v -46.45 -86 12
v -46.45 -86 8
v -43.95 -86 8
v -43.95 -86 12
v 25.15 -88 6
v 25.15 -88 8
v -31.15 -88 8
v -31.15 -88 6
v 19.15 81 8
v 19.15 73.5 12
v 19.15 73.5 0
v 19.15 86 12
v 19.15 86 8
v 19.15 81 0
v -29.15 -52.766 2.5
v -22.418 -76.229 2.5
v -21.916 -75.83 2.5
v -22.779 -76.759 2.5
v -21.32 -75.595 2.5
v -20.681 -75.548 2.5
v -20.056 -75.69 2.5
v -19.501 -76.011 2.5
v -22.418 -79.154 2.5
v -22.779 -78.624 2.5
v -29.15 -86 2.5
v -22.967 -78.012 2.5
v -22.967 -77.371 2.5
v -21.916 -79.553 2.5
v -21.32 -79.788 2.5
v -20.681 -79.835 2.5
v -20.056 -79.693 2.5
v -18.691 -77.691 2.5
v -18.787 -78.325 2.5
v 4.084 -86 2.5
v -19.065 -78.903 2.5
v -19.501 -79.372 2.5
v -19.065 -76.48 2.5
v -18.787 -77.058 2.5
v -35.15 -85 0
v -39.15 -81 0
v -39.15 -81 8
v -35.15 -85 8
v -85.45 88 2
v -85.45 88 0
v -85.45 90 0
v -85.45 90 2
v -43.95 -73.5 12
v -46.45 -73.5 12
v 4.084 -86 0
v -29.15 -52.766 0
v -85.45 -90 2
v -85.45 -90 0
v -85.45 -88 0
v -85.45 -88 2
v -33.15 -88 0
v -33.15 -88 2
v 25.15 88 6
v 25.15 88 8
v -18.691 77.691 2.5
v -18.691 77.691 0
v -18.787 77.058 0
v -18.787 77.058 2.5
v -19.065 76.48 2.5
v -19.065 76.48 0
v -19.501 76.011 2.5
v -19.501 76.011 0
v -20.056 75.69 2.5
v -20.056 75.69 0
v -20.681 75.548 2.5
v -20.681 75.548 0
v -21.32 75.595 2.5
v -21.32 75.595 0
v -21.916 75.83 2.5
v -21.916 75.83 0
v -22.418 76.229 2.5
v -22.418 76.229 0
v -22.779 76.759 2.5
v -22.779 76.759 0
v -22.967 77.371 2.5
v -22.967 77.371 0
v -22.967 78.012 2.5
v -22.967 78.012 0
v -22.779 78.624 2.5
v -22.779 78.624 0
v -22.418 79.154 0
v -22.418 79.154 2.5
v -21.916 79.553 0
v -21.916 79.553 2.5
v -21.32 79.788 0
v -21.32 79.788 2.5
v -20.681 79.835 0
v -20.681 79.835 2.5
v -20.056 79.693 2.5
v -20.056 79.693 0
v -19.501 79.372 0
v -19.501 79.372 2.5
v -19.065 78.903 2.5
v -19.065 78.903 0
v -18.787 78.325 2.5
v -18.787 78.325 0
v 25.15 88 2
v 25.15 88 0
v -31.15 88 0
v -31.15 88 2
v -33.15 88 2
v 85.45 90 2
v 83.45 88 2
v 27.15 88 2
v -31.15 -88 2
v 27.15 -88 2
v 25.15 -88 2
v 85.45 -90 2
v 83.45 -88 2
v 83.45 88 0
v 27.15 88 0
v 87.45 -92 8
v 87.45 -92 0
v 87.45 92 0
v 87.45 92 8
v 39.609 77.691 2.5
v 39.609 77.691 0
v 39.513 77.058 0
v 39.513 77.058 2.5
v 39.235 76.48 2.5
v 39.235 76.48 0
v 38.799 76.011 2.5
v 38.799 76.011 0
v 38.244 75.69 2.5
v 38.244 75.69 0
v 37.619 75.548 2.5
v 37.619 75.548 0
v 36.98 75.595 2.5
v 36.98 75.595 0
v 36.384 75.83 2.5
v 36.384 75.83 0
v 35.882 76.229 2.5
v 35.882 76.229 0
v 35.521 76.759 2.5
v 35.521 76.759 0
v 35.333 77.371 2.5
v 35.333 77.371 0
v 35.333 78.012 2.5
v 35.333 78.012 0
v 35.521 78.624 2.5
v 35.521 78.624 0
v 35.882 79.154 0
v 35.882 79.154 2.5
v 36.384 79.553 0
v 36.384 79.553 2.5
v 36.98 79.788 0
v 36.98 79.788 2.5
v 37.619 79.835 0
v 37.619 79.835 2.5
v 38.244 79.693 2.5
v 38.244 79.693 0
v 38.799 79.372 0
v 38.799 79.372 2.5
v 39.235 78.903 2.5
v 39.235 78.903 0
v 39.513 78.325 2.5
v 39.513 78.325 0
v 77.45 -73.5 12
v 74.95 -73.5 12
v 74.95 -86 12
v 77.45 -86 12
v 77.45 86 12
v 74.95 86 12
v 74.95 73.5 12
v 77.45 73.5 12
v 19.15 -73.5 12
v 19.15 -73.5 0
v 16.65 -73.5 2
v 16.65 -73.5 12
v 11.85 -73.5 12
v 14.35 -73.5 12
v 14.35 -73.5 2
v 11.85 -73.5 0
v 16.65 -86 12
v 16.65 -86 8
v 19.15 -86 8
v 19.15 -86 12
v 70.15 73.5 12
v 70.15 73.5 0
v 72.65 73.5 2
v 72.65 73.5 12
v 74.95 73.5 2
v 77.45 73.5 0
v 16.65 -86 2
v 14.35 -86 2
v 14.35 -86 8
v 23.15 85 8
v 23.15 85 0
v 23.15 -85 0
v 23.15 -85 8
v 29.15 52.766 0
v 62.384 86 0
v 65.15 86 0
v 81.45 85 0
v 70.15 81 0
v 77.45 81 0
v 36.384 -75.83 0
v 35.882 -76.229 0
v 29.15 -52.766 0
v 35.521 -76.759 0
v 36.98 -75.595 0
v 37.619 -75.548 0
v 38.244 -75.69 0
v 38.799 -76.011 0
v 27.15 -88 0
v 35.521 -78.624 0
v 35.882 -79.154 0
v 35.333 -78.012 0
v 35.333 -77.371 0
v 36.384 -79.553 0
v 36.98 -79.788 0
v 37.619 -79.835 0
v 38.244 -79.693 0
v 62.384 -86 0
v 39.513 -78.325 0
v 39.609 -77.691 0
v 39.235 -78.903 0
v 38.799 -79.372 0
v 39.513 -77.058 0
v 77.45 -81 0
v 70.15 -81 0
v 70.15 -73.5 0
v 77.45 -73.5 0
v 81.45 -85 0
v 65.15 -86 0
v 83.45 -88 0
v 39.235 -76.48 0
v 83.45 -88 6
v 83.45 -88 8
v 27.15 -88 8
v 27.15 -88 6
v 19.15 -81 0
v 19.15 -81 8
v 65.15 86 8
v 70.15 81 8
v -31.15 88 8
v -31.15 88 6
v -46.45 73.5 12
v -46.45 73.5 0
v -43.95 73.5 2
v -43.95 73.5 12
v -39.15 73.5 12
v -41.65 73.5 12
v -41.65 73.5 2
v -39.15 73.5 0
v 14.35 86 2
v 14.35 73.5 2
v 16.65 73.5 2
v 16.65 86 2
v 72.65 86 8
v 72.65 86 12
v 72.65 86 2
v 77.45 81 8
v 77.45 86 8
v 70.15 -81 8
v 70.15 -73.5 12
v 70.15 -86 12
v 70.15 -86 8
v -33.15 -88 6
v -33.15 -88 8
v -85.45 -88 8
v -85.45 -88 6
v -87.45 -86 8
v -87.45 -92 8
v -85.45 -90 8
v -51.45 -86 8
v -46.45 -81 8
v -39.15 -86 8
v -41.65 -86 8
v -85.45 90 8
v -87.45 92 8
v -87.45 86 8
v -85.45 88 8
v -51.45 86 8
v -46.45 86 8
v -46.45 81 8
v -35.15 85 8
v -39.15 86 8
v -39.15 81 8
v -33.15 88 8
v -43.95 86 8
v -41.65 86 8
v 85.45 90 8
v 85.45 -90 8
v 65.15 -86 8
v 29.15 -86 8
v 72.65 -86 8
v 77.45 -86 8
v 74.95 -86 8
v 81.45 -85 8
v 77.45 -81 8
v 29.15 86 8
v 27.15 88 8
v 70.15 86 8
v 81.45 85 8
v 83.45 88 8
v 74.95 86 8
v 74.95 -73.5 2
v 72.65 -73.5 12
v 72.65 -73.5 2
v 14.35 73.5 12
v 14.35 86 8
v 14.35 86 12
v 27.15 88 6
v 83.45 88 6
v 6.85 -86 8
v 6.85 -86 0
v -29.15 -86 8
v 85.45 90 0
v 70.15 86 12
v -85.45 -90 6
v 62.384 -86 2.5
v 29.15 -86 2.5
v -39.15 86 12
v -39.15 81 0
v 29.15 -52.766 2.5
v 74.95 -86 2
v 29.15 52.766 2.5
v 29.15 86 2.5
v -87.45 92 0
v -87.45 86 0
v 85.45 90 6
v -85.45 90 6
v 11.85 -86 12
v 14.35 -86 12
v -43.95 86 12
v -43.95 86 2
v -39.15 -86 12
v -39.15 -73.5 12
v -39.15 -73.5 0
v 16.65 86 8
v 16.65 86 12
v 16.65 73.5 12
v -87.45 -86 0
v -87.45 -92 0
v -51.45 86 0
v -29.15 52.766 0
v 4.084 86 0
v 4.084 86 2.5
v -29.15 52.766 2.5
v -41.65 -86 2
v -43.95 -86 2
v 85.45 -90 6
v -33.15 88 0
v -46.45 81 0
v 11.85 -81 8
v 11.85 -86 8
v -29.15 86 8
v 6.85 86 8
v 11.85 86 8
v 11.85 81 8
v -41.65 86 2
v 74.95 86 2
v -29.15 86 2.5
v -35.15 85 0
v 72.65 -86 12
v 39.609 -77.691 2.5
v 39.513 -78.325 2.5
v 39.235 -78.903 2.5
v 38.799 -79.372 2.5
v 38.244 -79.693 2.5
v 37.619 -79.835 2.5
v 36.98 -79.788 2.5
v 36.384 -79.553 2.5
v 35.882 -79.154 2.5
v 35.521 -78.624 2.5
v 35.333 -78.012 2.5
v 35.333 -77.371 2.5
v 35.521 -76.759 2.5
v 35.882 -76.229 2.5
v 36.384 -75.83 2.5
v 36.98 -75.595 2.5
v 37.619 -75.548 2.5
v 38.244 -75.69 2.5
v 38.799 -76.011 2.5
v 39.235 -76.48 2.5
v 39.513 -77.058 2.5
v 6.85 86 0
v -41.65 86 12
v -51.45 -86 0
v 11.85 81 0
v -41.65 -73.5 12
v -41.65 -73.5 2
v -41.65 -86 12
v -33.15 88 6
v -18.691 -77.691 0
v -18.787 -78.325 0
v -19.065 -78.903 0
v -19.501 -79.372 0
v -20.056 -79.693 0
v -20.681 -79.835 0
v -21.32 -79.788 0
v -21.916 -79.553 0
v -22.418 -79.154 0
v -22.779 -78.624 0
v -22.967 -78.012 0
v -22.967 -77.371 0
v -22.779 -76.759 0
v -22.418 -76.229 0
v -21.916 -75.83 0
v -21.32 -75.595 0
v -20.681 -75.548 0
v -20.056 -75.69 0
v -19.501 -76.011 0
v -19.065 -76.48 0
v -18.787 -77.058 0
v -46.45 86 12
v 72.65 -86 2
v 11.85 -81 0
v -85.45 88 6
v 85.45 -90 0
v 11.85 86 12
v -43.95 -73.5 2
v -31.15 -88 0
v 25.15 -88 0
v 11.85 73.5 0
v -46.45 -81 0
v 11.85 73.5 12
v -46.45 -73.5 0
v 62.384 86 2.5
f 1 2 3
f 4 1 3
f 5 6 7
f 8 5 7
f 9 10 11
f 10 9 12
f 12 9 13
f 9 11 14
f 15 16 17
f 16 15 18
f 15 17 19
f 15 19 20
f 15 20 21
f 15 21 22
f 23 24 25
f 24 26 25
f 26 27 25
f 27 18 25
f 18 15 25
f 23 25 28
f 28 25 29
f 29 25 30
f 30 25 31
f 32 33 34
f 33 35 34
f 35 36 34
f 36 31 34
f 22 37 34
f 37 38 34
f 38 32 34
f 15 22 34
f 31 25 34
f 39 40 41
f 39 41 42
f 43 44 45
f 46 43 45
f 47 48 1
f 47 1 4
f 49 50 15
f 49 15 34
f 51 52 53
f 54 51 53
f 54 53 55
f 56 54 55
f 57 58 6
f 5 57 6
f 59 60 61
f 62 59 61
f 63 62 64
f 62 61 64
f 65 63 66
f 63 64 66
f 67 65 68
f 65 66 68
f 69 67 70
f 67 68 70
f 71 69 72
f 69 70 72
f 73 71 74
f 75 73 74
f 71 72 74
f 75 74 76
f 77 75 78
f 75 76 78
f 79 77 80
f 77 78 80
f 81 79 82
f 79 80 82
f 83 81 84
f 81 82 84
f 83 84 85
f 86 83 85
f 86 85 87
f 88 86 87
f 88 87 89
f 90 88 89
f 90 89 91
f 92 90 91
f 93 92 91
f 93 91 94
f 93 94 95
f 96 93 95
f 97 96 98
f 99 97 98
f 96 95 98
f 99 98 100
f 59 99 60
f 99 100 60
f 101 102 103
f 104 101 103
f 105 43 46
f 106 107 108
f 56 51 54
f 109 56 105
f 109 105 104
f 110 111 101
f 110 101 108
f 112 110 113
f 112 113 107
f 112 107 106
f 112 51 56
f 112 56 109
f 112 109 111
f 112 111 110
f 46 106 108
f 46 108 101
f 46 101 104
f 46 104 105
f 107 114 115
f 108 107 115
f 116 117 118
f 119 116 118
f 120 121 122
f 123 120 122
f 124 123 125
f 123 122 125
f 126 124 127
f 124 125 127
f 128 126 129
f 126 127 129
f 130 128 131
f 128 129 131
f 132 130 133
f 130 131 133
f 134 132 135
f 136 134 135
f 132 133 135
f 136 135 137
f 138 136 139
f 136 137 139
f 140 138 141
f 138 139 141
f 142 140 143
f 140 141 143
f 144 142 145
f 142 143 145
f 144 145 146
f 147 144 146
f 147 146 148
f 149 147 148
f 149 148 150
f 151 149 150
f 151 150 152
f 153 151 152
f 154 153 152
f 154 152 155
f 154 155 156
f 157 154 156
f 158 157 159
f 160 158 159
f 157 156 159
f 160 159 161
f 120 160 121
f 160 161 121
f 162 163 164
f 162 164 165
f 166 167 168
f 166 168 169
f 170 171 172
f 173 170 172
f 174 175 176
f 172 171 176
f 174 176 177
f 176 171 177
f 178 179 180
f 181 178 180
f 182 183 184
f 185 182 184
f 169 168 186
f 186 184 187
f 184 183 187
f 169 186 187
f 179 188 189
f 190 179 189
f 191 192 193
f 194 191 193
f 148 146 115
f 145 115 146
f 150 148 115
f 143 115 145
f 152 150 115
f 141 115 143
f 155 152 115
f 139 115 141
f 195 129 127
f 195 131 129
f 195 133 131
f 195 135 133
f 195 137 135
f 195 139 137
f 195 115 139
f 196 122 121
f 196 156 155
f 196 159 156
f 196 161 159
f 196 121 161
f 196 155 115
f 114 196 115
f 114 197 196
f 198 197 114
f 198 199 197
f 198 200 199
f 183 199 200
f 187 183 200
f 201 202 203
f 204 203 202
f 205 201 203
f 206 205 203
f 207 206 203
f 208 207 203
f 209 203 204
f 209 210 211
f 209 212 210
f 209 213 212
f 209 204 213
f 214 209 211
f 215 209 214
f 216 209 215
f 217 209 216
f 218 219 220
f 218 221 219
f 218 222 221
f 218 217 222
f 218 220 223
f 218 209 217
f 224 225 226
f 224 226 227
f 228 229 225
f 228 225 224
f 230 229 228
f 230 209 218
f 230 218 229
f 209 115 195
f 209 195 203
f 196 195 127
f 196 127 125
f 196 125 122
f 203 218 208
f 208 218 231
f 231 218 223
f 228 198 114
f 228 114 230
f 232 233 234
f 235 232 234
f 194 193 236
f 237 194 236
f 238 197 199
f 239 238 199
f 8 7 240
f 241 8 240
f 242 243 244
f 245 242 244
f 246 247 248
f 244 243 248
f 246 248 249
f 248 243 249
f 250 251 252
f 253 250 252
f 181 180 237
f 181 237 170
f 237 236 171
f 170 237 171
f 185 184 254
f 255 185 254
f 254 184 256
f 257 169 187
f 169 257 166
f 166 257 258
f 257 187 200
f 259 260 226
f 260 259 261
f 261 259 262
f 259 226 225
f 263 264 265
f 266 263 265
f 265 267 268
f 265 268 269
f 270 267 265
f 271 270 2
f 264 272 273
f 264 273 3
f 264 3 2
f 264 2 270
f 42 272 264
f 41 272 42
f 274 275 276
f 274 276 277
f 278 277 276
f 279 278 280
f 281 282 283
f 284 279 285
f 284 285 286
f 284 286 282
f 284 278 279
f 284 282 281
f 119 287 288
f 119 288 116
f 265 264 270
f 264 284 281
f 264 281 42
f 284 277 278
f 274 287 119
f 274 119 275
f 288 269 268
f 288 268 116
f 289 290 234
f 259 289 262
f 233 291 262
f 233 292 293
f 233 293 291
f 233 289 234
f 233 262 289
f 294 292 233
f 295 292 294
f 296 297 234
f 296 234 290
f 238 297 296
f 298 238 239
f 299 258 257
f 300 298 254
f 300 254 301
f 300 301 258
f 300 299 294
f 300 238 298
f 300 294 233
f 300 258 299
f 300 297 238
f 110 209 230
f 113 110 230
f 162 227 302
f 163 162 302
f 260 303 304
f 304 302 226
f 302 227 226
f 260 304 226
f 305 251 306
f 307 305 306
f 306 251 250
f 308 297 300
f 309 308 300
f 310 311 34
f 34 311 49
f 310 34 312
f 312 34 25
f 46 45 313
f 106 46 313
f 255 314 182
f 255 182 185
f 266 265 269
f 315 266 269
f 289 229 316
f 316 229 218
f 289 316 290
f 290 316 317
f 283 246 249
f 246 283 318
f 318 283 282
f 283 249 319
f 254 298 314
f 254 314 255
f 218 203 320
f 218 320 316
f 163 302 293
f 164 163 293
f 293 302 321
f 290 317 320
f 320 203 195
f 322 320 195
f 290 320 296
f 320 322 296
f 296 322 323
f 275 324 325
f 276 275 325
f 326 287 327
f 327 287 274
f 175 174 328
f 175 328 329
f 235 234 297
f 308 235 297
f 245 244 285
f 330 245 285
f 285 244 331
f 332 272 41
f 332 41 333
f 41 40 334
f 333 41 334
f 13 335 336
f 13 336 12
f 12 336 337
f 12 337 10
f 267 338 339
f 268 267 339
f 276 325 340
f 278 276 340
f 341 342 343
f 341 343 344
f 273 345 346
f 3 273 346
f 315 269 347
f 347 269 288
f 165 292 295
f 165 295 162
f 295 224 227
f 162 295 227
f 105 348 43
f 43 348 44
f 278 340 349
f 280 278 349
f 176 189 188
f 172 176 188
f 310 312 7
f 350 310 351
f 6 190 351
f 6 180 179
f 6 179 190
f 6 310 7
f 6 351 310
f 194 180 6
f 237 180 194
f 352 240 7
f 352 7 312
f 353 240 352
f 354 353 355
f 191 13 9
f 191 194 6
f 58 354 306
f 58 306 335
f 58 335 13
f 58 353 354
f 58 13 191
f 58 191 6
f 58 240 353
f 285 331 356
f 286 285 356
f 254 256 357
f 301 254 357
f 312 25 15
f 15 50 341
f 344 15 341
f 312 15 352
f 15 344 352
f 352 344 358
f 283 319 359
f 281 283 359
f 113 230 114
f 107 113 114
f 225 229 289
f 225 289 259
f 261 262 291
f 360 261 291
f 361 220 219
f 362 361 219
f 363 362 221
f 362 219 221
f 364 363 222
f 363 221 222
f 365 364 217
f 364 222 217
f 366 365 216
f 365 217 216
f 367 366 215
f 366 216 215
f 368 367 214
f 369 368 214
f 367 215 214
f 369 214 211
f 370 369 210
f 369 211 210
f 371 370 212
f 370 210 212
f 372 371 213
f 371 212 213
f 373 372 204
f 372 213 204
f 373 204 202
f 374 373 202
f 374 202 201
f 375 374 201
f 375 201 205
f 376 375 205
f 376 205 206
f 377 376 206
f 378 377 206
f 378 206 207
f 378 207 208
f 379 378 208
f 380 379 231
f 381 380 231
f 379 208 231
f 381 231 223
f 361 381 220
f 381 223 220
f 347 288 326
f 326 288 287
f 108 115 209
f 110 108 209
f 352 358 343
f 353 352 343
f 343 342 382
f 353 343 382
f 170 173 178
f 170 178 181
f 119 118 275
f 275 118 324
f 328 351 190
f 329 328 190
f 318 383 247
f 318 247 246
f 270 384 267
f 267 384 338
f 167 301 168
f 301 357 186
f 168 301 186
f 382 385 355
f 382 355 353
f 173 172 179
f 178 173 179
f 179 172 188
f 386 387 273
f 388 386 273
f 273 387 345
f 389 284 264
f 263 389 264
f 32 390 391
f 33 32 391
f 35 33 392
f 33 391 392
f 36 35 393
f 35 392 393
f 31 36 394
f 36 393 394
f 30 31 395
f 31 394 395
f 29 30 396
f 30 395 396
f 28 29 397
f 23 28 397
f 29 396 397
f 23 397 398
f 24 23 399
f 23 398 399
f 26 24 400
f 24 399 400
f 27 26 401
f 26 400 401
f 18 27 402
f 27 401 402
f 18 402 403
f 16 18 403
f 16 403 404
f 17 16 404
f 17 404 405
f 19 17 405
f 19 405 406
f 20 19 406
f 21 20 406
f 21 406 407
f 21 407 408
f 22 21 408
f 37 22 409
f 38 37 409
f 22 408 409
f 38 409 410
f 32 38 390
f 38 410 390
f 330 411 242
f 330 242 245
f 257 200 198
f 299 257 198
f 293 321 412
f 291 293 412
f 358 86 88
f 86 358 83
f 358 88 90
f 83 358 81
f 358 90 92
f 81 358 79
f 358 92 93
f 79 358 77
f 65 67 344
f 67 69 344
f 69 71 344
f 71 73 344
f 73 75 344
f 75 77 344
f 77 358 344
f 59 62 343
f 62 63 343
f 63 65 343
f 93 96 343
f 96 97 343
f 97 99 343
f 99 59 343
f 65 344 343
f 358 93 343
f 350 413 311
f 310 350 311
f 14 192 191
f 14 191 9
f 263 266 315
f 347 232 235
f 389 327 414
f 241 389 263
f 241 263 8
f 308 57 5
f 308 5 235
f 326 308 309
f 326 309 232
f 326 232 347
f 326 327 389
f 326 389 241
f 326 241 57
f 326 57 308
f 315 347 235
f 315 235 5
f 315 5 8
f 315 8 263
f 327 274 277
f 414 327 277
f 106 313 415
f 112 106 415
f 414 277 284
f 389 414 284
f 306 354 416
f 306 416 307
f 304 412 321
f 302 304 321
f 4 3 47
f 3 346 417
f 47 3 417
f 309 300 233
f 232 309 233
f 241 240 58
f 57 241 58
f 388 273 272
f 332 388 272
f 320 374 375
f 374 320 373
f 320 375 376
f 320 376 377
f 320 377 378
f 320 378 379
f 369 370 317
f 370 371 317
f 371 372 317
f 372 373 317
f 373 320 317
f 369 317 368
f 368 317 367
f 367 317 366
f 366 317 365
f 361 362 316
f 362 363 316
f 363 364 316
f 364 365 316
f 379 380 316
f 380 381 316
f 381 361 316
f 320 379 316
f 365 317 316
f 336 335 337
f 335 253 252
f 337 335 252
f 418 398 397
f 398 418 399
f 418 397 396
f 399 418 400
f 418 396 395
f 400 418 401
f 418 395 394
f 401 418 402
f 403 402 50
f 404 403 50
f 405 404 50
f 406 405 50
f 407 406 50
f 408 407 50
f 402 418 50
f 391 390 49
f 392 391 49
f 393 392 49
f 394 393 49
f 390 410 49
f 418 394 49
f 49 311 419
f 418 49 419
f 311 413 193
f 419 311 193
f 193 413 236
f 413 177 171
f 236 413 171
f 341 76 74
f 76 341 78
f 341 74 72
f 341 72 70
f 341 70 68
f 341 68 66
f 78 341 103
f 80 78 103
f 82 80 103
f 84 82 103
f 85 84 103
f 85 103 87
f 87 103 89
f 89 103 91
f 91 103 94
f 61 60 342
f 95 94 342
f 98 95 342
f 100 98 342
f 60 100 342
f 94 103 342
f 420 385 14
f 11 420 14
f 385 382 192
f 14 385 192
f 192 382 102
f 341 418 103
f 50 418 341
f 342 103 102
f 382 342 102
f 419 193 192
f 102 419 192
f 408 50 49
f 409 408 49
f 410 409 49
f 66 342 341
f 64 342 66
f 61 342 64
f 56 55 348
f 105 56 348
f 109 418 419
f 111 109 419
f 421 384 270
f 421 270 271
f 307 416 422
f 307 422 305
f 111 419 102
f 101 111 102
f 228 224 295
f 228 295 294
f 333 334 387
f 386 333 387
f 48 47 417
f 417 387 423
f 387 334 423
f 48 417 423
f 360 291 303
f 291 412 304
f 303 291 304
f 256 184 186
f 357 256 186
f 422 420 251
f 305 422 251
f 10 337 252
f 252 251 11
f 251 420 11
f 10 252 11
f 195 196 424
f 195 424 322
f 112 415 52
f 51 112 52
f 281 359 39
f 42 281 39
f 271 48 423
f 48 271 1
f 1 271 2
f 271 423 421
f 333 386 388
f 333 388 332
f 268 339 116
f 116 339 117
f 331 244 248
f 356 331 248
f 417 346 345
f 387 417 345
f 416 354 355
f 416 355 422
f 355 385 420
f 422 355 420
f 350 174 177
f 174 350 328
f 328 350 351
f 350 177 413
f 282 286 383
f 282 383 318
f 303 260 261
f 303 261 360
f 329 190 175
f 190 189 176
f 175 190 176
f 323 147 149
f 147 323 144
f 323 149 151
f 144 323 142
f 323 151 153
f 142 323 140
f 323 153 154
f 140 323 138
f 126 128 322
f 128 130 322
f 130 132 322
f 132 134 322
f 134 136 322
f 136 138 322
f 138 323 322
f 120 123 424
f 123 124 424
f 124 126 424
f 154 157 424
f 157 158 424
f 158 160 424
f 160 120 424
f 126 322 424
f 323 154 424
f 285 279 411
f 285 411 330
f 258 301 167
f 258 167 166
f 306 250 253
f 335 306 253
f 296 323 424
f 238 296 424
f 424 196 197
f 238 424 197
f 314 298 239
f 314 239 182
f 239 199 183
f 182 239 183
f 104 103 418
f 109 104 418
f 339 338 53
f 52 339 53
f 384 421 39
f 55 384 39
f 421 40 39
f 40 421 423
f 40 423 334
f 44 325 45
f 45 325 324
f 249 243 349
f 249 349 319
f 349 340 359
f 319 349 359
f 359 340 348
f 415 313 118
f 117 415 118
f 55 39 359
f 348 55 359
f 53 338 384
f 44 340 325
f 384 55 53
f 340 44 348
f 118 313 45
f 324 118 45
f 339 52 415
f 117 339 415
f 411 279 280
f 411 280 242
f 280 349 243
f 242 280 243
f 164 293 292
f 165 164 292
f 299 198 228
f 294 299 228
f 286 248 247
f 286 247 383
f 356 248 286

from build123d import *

# Parameters (mm, degrees)
F1_DEPTH     = 8
F2_W         = 2.5
F2_H         = 12.5
F3_DEPTH     = 4
F4_W         = 7.3
F4_H         = 12.5
F5_DEPTH     = 2
F7_DEPTH     = 2
F9_DEPTH     = 2
F10_T1_DEPTH = 8
F11_R        = 2.15
F12_DEPTH    = 2.5


# Not quite as in the source:
# - a fillet or chamfer that OpenCascade refuses, or shapes differently, is made with other operations: its cross-section is extruded or revolved along the edge and cut away or added


with BuildPart() as f1:
    # F0 (on Top) → F1 (new body)
    with BuildSketch(Plane.XY):
        Polygon((87.45, 92), (-87.45, 92), (-87.45, 86), (-46.45, 86), (-46.45, 73.5), (-43.95, 73.5), (-43.95, 86), (-41.65, 86), (-41.65, 73.5), (-39.15, 73.5), (-39.15, 86), (-35.15, 86), (-35.15, 0), (-35.15, -86), (-39.15, -86), (-39.15, -73.5), (-41.65, -73.5), (-41.65, -86), (-43.95, -86), (-43.95, -73.5), (-46.45, -73.5), (-46.45, -86), (-87.45, -86), (-87.45, -92), (87.45, -92), (87.45, 0), align=None)
        Polygon((-29.15, -86), (-29.15, 0), (-29.15, 86), (11.85, 86), (11.85, 73.5), (14.35, 73.5), (14.35, 86), (16.65, 86), (16.65, 73.5), (19.15, 73.5), (19.15, 86), (23.15, 86), (23.15, 0), (23.15, -86), (19.15, -86), (19.15, -73.5), (16.65, -73.5), (16.65, -86), (14.35, -86), (14.35, -73.5), (11.85, -73.5), (11.85, -86), align=None, mode=Mode.SUBTRACT)
        Polygon((29.15, -86), (29.15, 0), (29.15, 86), (70.15, 86), (70.15, 73.5), (72.65, 73.5), (72.65, 86), (74.95, 86), (74.95, 73.5), (77.45, 73.5), (77.45, 86), (81.45, 86), (81.45, 0), (81.45, -86), (77.45, -86), (77.45, -73.5), (74.95, -73.5), (74.95, -86), (72.65, -86), (72.65, -73.5), (70.15, -73.5), (70.15, -86), align=None, mode=Mode.SUBTRACT)
    extrude(amount=F1_DEPTH)

    # F2 (on face) → F3 (join)
    with BuildSketch(Plane.XY.offset(8)):
        with Locations((-40.4, 79.75)):
            Rectangle(F2_W, F2_H)
        with Locations((-45.2, 79.75)):
            Rectangle(F2_W, F2_H)
        with Locations((13.1, 79.75)):
            Rectangle(F2_W, F2_H)
        with Locations((17.9, 79.75)):
            Rectangle(F2_W, F2_H)
        with Locations((76.2, 79.75)):
            Rectangle(F2_W, F2_H)
        with Locations((71.4, 79.75)):
            Rectangle(F2_W, F2_H)
        with Locations((76.2, -79.75)):
            Rectangle(F2_W, F2_H)
        with Locations((71.4, -79.75)):
            Rectangle(F2_W, F2_H)
        with Locations((-40.4, -79.75)):
            Rectangle(F2_W, F2_H)
        with Locations((-45.2, -79.75)):
            Rectangle(F2_W, F2_H)
        with Locations((17.9, -79.75)):
            Rectangle(F2_W, F2_H)
        with Locations((13.1, -79.75)):
            Rectangle(F2_W, F2_H)
    extrude(amount=F3_DEPTH)

    # F4 (on face) → F5 (join)
    with BuildSketch(Plane(origin=(0, 0, 0), x_dir=(1, 0, 0), z_dir=(0, 0, -1))):
        with Locations((-42.8, 79.75)):
            Rectangle(F4_W, F4_H)
        with Locations((15.5, 79.75)):
            Rectangle(F4_W, F4_H)
        with Locations((73.8, 79.75)):
            Rectangle(F4_W, F4_H)
        with Locations((15.5, -79.75)):
            Rectangle(F4_W, F4_H)
        with Locations((-42.8, -79.75)):
            Rectangle(F4_W, F4_H)
        with Locations((73.8, -79.75)):
            Rectangle(F4_W, F4_H)
    extrude(amount=-F5_DEPTH)

    # F6 (on face) → F7 (cut)
    with BuildSketch(Plane.XY.offset(8)):
        Polygon((85.45, 90), (-85.45, 90), (-85.45, 88), (-33.15, 88), (-33.15, 0), (-33.15, -88), (-85.45, -88), (-85.45, -90), (85.45, -90), (85.45, 0), align=None)
        Polygon((25.15, 88), (25.15, 0), (25.15, -88), (-31.15, -88), (-31.15, 0), (-31.15, 88), align=None, mode=Mode.SUBTRACT)
        Polygon((27.15, 88), (83.45, 88), (83.45, 0), (83.45, -88), (27.15, -88), (27.15, 0), align=None, mode=Mode.SUBTRACT)
    extrude(amount=-F7_DEPTH, mode=Mode.SUBTRACT)

    # F8 (on face) → F9 (cut)
    with BuildSketch(Plane(origin=(0, 0, 0), x_dir=(1, 0, 0), z_dir=(0, 0, -1))):
        Polygon((85.45, 90), (-85.45, 90), (-85.45, 88), (-33.15, 88), (-33.15, 0), (-33.15, -88), (-85.45, -88), (-85.45, -90), (85.45, -90), (85.45, 0), align=None)
        Polygon((25.15, 88), (25.15, 0), (25.15, -88), (-31.15, -88), (-31.15, 0), (-31.15, 88), align=None, mode=Mode.SUBTRACT)
        Polygon((27.15, 88), (83.45, 88), (83.45, 0), (83.45, -88), (27.15, -88), (27.15, 0), align=None, mode=Mode.SUBTRACT)
    extrude(amount=-F9_DEPTH, mode=Mode.SUBTRACT)

    # F10: chamfer of 5 on 12 edges, made by hand

    # F10_s2 → F10_t1 (join)
    with BuildSketch(Plane.XY):
        Polygon((-39.15, 81), (-34.15, 86), (-39.15, 86), align=None)
        Polygon((-51.45, 86), (-46.45, 81), (-46.45, 86), align=None)
        Polygon((11.85, 81), (6.85, 86), (11.85, 86), align=None)
        Polygon((24.15, 86), (19.15, 81), (19.15, 86), align=None)
        Polygon((77.45, 81), (82.45, 86), (77.45, 86), align=None)
        Polygon((65.15, 86), (70.15, 81), (70.15, 86), align=None)
        Polygon((77.45, -81), (82.45, -86), (77.45, -86), align=None)
        Polygon((65.15, -86), (70.15, -81), (70.15, -86), align=None)
        Polygon((11.85, -81), (6.85, -86), (11.85, -86), align=None)
        Polygon((-51.45, -86), (-46.45, -81), (-46.45, -86), align=None)
        Polygon((-39.15, -81), (-34.15, -86), (-39.15, -86), align=None)
        Polygon((24.15, -86), (19.15, -81), (19.15, -86), align=None)
    extrude(amount=F10_T1_DEPTH)

    # F11 (on face) → F12 (join)
    with BuildSketch(Plane(origin=(0, 0, 0), x_dir=(1, 0, 0), z_dir=(0, 0, -1))):
        Polygon((29.15, -52.7659812842), (29.15, -86), (62.3840187158, -86), align=None)
        with Locations((37.4585046789, -77.6914953211)):
            Circle(F11_R, mode=Mode.SUBTRACT)
        Polygon((29.15, 86), (29.15, 52.7659812842), (62.3840187158, 86), align=None)
        with Locations((37.4585046789, 77.6914953211)):
            Circle(F11_R, mode=Mode.SUBTRACT)
        Polygon((-29.15, -52.7659812842), (-29.15, -86), (4.0840187158, -86), align=None)
        with Locations((-20.8414953211, -77.6914953211)):
            Circle(F11_R, mode=Mode.SUBTRACT)
        Polygon((-29.15, 86), (-29.15, 52.7659812842), (4.0840187158, 86), align=None)
        with Locations((-20.8414953211, 77.6914953211)):
            Circle(F11_R, mode=Mode.SUBTRACT)
    extrude(amount=-F12_DEPTH)


solid = f1.part
